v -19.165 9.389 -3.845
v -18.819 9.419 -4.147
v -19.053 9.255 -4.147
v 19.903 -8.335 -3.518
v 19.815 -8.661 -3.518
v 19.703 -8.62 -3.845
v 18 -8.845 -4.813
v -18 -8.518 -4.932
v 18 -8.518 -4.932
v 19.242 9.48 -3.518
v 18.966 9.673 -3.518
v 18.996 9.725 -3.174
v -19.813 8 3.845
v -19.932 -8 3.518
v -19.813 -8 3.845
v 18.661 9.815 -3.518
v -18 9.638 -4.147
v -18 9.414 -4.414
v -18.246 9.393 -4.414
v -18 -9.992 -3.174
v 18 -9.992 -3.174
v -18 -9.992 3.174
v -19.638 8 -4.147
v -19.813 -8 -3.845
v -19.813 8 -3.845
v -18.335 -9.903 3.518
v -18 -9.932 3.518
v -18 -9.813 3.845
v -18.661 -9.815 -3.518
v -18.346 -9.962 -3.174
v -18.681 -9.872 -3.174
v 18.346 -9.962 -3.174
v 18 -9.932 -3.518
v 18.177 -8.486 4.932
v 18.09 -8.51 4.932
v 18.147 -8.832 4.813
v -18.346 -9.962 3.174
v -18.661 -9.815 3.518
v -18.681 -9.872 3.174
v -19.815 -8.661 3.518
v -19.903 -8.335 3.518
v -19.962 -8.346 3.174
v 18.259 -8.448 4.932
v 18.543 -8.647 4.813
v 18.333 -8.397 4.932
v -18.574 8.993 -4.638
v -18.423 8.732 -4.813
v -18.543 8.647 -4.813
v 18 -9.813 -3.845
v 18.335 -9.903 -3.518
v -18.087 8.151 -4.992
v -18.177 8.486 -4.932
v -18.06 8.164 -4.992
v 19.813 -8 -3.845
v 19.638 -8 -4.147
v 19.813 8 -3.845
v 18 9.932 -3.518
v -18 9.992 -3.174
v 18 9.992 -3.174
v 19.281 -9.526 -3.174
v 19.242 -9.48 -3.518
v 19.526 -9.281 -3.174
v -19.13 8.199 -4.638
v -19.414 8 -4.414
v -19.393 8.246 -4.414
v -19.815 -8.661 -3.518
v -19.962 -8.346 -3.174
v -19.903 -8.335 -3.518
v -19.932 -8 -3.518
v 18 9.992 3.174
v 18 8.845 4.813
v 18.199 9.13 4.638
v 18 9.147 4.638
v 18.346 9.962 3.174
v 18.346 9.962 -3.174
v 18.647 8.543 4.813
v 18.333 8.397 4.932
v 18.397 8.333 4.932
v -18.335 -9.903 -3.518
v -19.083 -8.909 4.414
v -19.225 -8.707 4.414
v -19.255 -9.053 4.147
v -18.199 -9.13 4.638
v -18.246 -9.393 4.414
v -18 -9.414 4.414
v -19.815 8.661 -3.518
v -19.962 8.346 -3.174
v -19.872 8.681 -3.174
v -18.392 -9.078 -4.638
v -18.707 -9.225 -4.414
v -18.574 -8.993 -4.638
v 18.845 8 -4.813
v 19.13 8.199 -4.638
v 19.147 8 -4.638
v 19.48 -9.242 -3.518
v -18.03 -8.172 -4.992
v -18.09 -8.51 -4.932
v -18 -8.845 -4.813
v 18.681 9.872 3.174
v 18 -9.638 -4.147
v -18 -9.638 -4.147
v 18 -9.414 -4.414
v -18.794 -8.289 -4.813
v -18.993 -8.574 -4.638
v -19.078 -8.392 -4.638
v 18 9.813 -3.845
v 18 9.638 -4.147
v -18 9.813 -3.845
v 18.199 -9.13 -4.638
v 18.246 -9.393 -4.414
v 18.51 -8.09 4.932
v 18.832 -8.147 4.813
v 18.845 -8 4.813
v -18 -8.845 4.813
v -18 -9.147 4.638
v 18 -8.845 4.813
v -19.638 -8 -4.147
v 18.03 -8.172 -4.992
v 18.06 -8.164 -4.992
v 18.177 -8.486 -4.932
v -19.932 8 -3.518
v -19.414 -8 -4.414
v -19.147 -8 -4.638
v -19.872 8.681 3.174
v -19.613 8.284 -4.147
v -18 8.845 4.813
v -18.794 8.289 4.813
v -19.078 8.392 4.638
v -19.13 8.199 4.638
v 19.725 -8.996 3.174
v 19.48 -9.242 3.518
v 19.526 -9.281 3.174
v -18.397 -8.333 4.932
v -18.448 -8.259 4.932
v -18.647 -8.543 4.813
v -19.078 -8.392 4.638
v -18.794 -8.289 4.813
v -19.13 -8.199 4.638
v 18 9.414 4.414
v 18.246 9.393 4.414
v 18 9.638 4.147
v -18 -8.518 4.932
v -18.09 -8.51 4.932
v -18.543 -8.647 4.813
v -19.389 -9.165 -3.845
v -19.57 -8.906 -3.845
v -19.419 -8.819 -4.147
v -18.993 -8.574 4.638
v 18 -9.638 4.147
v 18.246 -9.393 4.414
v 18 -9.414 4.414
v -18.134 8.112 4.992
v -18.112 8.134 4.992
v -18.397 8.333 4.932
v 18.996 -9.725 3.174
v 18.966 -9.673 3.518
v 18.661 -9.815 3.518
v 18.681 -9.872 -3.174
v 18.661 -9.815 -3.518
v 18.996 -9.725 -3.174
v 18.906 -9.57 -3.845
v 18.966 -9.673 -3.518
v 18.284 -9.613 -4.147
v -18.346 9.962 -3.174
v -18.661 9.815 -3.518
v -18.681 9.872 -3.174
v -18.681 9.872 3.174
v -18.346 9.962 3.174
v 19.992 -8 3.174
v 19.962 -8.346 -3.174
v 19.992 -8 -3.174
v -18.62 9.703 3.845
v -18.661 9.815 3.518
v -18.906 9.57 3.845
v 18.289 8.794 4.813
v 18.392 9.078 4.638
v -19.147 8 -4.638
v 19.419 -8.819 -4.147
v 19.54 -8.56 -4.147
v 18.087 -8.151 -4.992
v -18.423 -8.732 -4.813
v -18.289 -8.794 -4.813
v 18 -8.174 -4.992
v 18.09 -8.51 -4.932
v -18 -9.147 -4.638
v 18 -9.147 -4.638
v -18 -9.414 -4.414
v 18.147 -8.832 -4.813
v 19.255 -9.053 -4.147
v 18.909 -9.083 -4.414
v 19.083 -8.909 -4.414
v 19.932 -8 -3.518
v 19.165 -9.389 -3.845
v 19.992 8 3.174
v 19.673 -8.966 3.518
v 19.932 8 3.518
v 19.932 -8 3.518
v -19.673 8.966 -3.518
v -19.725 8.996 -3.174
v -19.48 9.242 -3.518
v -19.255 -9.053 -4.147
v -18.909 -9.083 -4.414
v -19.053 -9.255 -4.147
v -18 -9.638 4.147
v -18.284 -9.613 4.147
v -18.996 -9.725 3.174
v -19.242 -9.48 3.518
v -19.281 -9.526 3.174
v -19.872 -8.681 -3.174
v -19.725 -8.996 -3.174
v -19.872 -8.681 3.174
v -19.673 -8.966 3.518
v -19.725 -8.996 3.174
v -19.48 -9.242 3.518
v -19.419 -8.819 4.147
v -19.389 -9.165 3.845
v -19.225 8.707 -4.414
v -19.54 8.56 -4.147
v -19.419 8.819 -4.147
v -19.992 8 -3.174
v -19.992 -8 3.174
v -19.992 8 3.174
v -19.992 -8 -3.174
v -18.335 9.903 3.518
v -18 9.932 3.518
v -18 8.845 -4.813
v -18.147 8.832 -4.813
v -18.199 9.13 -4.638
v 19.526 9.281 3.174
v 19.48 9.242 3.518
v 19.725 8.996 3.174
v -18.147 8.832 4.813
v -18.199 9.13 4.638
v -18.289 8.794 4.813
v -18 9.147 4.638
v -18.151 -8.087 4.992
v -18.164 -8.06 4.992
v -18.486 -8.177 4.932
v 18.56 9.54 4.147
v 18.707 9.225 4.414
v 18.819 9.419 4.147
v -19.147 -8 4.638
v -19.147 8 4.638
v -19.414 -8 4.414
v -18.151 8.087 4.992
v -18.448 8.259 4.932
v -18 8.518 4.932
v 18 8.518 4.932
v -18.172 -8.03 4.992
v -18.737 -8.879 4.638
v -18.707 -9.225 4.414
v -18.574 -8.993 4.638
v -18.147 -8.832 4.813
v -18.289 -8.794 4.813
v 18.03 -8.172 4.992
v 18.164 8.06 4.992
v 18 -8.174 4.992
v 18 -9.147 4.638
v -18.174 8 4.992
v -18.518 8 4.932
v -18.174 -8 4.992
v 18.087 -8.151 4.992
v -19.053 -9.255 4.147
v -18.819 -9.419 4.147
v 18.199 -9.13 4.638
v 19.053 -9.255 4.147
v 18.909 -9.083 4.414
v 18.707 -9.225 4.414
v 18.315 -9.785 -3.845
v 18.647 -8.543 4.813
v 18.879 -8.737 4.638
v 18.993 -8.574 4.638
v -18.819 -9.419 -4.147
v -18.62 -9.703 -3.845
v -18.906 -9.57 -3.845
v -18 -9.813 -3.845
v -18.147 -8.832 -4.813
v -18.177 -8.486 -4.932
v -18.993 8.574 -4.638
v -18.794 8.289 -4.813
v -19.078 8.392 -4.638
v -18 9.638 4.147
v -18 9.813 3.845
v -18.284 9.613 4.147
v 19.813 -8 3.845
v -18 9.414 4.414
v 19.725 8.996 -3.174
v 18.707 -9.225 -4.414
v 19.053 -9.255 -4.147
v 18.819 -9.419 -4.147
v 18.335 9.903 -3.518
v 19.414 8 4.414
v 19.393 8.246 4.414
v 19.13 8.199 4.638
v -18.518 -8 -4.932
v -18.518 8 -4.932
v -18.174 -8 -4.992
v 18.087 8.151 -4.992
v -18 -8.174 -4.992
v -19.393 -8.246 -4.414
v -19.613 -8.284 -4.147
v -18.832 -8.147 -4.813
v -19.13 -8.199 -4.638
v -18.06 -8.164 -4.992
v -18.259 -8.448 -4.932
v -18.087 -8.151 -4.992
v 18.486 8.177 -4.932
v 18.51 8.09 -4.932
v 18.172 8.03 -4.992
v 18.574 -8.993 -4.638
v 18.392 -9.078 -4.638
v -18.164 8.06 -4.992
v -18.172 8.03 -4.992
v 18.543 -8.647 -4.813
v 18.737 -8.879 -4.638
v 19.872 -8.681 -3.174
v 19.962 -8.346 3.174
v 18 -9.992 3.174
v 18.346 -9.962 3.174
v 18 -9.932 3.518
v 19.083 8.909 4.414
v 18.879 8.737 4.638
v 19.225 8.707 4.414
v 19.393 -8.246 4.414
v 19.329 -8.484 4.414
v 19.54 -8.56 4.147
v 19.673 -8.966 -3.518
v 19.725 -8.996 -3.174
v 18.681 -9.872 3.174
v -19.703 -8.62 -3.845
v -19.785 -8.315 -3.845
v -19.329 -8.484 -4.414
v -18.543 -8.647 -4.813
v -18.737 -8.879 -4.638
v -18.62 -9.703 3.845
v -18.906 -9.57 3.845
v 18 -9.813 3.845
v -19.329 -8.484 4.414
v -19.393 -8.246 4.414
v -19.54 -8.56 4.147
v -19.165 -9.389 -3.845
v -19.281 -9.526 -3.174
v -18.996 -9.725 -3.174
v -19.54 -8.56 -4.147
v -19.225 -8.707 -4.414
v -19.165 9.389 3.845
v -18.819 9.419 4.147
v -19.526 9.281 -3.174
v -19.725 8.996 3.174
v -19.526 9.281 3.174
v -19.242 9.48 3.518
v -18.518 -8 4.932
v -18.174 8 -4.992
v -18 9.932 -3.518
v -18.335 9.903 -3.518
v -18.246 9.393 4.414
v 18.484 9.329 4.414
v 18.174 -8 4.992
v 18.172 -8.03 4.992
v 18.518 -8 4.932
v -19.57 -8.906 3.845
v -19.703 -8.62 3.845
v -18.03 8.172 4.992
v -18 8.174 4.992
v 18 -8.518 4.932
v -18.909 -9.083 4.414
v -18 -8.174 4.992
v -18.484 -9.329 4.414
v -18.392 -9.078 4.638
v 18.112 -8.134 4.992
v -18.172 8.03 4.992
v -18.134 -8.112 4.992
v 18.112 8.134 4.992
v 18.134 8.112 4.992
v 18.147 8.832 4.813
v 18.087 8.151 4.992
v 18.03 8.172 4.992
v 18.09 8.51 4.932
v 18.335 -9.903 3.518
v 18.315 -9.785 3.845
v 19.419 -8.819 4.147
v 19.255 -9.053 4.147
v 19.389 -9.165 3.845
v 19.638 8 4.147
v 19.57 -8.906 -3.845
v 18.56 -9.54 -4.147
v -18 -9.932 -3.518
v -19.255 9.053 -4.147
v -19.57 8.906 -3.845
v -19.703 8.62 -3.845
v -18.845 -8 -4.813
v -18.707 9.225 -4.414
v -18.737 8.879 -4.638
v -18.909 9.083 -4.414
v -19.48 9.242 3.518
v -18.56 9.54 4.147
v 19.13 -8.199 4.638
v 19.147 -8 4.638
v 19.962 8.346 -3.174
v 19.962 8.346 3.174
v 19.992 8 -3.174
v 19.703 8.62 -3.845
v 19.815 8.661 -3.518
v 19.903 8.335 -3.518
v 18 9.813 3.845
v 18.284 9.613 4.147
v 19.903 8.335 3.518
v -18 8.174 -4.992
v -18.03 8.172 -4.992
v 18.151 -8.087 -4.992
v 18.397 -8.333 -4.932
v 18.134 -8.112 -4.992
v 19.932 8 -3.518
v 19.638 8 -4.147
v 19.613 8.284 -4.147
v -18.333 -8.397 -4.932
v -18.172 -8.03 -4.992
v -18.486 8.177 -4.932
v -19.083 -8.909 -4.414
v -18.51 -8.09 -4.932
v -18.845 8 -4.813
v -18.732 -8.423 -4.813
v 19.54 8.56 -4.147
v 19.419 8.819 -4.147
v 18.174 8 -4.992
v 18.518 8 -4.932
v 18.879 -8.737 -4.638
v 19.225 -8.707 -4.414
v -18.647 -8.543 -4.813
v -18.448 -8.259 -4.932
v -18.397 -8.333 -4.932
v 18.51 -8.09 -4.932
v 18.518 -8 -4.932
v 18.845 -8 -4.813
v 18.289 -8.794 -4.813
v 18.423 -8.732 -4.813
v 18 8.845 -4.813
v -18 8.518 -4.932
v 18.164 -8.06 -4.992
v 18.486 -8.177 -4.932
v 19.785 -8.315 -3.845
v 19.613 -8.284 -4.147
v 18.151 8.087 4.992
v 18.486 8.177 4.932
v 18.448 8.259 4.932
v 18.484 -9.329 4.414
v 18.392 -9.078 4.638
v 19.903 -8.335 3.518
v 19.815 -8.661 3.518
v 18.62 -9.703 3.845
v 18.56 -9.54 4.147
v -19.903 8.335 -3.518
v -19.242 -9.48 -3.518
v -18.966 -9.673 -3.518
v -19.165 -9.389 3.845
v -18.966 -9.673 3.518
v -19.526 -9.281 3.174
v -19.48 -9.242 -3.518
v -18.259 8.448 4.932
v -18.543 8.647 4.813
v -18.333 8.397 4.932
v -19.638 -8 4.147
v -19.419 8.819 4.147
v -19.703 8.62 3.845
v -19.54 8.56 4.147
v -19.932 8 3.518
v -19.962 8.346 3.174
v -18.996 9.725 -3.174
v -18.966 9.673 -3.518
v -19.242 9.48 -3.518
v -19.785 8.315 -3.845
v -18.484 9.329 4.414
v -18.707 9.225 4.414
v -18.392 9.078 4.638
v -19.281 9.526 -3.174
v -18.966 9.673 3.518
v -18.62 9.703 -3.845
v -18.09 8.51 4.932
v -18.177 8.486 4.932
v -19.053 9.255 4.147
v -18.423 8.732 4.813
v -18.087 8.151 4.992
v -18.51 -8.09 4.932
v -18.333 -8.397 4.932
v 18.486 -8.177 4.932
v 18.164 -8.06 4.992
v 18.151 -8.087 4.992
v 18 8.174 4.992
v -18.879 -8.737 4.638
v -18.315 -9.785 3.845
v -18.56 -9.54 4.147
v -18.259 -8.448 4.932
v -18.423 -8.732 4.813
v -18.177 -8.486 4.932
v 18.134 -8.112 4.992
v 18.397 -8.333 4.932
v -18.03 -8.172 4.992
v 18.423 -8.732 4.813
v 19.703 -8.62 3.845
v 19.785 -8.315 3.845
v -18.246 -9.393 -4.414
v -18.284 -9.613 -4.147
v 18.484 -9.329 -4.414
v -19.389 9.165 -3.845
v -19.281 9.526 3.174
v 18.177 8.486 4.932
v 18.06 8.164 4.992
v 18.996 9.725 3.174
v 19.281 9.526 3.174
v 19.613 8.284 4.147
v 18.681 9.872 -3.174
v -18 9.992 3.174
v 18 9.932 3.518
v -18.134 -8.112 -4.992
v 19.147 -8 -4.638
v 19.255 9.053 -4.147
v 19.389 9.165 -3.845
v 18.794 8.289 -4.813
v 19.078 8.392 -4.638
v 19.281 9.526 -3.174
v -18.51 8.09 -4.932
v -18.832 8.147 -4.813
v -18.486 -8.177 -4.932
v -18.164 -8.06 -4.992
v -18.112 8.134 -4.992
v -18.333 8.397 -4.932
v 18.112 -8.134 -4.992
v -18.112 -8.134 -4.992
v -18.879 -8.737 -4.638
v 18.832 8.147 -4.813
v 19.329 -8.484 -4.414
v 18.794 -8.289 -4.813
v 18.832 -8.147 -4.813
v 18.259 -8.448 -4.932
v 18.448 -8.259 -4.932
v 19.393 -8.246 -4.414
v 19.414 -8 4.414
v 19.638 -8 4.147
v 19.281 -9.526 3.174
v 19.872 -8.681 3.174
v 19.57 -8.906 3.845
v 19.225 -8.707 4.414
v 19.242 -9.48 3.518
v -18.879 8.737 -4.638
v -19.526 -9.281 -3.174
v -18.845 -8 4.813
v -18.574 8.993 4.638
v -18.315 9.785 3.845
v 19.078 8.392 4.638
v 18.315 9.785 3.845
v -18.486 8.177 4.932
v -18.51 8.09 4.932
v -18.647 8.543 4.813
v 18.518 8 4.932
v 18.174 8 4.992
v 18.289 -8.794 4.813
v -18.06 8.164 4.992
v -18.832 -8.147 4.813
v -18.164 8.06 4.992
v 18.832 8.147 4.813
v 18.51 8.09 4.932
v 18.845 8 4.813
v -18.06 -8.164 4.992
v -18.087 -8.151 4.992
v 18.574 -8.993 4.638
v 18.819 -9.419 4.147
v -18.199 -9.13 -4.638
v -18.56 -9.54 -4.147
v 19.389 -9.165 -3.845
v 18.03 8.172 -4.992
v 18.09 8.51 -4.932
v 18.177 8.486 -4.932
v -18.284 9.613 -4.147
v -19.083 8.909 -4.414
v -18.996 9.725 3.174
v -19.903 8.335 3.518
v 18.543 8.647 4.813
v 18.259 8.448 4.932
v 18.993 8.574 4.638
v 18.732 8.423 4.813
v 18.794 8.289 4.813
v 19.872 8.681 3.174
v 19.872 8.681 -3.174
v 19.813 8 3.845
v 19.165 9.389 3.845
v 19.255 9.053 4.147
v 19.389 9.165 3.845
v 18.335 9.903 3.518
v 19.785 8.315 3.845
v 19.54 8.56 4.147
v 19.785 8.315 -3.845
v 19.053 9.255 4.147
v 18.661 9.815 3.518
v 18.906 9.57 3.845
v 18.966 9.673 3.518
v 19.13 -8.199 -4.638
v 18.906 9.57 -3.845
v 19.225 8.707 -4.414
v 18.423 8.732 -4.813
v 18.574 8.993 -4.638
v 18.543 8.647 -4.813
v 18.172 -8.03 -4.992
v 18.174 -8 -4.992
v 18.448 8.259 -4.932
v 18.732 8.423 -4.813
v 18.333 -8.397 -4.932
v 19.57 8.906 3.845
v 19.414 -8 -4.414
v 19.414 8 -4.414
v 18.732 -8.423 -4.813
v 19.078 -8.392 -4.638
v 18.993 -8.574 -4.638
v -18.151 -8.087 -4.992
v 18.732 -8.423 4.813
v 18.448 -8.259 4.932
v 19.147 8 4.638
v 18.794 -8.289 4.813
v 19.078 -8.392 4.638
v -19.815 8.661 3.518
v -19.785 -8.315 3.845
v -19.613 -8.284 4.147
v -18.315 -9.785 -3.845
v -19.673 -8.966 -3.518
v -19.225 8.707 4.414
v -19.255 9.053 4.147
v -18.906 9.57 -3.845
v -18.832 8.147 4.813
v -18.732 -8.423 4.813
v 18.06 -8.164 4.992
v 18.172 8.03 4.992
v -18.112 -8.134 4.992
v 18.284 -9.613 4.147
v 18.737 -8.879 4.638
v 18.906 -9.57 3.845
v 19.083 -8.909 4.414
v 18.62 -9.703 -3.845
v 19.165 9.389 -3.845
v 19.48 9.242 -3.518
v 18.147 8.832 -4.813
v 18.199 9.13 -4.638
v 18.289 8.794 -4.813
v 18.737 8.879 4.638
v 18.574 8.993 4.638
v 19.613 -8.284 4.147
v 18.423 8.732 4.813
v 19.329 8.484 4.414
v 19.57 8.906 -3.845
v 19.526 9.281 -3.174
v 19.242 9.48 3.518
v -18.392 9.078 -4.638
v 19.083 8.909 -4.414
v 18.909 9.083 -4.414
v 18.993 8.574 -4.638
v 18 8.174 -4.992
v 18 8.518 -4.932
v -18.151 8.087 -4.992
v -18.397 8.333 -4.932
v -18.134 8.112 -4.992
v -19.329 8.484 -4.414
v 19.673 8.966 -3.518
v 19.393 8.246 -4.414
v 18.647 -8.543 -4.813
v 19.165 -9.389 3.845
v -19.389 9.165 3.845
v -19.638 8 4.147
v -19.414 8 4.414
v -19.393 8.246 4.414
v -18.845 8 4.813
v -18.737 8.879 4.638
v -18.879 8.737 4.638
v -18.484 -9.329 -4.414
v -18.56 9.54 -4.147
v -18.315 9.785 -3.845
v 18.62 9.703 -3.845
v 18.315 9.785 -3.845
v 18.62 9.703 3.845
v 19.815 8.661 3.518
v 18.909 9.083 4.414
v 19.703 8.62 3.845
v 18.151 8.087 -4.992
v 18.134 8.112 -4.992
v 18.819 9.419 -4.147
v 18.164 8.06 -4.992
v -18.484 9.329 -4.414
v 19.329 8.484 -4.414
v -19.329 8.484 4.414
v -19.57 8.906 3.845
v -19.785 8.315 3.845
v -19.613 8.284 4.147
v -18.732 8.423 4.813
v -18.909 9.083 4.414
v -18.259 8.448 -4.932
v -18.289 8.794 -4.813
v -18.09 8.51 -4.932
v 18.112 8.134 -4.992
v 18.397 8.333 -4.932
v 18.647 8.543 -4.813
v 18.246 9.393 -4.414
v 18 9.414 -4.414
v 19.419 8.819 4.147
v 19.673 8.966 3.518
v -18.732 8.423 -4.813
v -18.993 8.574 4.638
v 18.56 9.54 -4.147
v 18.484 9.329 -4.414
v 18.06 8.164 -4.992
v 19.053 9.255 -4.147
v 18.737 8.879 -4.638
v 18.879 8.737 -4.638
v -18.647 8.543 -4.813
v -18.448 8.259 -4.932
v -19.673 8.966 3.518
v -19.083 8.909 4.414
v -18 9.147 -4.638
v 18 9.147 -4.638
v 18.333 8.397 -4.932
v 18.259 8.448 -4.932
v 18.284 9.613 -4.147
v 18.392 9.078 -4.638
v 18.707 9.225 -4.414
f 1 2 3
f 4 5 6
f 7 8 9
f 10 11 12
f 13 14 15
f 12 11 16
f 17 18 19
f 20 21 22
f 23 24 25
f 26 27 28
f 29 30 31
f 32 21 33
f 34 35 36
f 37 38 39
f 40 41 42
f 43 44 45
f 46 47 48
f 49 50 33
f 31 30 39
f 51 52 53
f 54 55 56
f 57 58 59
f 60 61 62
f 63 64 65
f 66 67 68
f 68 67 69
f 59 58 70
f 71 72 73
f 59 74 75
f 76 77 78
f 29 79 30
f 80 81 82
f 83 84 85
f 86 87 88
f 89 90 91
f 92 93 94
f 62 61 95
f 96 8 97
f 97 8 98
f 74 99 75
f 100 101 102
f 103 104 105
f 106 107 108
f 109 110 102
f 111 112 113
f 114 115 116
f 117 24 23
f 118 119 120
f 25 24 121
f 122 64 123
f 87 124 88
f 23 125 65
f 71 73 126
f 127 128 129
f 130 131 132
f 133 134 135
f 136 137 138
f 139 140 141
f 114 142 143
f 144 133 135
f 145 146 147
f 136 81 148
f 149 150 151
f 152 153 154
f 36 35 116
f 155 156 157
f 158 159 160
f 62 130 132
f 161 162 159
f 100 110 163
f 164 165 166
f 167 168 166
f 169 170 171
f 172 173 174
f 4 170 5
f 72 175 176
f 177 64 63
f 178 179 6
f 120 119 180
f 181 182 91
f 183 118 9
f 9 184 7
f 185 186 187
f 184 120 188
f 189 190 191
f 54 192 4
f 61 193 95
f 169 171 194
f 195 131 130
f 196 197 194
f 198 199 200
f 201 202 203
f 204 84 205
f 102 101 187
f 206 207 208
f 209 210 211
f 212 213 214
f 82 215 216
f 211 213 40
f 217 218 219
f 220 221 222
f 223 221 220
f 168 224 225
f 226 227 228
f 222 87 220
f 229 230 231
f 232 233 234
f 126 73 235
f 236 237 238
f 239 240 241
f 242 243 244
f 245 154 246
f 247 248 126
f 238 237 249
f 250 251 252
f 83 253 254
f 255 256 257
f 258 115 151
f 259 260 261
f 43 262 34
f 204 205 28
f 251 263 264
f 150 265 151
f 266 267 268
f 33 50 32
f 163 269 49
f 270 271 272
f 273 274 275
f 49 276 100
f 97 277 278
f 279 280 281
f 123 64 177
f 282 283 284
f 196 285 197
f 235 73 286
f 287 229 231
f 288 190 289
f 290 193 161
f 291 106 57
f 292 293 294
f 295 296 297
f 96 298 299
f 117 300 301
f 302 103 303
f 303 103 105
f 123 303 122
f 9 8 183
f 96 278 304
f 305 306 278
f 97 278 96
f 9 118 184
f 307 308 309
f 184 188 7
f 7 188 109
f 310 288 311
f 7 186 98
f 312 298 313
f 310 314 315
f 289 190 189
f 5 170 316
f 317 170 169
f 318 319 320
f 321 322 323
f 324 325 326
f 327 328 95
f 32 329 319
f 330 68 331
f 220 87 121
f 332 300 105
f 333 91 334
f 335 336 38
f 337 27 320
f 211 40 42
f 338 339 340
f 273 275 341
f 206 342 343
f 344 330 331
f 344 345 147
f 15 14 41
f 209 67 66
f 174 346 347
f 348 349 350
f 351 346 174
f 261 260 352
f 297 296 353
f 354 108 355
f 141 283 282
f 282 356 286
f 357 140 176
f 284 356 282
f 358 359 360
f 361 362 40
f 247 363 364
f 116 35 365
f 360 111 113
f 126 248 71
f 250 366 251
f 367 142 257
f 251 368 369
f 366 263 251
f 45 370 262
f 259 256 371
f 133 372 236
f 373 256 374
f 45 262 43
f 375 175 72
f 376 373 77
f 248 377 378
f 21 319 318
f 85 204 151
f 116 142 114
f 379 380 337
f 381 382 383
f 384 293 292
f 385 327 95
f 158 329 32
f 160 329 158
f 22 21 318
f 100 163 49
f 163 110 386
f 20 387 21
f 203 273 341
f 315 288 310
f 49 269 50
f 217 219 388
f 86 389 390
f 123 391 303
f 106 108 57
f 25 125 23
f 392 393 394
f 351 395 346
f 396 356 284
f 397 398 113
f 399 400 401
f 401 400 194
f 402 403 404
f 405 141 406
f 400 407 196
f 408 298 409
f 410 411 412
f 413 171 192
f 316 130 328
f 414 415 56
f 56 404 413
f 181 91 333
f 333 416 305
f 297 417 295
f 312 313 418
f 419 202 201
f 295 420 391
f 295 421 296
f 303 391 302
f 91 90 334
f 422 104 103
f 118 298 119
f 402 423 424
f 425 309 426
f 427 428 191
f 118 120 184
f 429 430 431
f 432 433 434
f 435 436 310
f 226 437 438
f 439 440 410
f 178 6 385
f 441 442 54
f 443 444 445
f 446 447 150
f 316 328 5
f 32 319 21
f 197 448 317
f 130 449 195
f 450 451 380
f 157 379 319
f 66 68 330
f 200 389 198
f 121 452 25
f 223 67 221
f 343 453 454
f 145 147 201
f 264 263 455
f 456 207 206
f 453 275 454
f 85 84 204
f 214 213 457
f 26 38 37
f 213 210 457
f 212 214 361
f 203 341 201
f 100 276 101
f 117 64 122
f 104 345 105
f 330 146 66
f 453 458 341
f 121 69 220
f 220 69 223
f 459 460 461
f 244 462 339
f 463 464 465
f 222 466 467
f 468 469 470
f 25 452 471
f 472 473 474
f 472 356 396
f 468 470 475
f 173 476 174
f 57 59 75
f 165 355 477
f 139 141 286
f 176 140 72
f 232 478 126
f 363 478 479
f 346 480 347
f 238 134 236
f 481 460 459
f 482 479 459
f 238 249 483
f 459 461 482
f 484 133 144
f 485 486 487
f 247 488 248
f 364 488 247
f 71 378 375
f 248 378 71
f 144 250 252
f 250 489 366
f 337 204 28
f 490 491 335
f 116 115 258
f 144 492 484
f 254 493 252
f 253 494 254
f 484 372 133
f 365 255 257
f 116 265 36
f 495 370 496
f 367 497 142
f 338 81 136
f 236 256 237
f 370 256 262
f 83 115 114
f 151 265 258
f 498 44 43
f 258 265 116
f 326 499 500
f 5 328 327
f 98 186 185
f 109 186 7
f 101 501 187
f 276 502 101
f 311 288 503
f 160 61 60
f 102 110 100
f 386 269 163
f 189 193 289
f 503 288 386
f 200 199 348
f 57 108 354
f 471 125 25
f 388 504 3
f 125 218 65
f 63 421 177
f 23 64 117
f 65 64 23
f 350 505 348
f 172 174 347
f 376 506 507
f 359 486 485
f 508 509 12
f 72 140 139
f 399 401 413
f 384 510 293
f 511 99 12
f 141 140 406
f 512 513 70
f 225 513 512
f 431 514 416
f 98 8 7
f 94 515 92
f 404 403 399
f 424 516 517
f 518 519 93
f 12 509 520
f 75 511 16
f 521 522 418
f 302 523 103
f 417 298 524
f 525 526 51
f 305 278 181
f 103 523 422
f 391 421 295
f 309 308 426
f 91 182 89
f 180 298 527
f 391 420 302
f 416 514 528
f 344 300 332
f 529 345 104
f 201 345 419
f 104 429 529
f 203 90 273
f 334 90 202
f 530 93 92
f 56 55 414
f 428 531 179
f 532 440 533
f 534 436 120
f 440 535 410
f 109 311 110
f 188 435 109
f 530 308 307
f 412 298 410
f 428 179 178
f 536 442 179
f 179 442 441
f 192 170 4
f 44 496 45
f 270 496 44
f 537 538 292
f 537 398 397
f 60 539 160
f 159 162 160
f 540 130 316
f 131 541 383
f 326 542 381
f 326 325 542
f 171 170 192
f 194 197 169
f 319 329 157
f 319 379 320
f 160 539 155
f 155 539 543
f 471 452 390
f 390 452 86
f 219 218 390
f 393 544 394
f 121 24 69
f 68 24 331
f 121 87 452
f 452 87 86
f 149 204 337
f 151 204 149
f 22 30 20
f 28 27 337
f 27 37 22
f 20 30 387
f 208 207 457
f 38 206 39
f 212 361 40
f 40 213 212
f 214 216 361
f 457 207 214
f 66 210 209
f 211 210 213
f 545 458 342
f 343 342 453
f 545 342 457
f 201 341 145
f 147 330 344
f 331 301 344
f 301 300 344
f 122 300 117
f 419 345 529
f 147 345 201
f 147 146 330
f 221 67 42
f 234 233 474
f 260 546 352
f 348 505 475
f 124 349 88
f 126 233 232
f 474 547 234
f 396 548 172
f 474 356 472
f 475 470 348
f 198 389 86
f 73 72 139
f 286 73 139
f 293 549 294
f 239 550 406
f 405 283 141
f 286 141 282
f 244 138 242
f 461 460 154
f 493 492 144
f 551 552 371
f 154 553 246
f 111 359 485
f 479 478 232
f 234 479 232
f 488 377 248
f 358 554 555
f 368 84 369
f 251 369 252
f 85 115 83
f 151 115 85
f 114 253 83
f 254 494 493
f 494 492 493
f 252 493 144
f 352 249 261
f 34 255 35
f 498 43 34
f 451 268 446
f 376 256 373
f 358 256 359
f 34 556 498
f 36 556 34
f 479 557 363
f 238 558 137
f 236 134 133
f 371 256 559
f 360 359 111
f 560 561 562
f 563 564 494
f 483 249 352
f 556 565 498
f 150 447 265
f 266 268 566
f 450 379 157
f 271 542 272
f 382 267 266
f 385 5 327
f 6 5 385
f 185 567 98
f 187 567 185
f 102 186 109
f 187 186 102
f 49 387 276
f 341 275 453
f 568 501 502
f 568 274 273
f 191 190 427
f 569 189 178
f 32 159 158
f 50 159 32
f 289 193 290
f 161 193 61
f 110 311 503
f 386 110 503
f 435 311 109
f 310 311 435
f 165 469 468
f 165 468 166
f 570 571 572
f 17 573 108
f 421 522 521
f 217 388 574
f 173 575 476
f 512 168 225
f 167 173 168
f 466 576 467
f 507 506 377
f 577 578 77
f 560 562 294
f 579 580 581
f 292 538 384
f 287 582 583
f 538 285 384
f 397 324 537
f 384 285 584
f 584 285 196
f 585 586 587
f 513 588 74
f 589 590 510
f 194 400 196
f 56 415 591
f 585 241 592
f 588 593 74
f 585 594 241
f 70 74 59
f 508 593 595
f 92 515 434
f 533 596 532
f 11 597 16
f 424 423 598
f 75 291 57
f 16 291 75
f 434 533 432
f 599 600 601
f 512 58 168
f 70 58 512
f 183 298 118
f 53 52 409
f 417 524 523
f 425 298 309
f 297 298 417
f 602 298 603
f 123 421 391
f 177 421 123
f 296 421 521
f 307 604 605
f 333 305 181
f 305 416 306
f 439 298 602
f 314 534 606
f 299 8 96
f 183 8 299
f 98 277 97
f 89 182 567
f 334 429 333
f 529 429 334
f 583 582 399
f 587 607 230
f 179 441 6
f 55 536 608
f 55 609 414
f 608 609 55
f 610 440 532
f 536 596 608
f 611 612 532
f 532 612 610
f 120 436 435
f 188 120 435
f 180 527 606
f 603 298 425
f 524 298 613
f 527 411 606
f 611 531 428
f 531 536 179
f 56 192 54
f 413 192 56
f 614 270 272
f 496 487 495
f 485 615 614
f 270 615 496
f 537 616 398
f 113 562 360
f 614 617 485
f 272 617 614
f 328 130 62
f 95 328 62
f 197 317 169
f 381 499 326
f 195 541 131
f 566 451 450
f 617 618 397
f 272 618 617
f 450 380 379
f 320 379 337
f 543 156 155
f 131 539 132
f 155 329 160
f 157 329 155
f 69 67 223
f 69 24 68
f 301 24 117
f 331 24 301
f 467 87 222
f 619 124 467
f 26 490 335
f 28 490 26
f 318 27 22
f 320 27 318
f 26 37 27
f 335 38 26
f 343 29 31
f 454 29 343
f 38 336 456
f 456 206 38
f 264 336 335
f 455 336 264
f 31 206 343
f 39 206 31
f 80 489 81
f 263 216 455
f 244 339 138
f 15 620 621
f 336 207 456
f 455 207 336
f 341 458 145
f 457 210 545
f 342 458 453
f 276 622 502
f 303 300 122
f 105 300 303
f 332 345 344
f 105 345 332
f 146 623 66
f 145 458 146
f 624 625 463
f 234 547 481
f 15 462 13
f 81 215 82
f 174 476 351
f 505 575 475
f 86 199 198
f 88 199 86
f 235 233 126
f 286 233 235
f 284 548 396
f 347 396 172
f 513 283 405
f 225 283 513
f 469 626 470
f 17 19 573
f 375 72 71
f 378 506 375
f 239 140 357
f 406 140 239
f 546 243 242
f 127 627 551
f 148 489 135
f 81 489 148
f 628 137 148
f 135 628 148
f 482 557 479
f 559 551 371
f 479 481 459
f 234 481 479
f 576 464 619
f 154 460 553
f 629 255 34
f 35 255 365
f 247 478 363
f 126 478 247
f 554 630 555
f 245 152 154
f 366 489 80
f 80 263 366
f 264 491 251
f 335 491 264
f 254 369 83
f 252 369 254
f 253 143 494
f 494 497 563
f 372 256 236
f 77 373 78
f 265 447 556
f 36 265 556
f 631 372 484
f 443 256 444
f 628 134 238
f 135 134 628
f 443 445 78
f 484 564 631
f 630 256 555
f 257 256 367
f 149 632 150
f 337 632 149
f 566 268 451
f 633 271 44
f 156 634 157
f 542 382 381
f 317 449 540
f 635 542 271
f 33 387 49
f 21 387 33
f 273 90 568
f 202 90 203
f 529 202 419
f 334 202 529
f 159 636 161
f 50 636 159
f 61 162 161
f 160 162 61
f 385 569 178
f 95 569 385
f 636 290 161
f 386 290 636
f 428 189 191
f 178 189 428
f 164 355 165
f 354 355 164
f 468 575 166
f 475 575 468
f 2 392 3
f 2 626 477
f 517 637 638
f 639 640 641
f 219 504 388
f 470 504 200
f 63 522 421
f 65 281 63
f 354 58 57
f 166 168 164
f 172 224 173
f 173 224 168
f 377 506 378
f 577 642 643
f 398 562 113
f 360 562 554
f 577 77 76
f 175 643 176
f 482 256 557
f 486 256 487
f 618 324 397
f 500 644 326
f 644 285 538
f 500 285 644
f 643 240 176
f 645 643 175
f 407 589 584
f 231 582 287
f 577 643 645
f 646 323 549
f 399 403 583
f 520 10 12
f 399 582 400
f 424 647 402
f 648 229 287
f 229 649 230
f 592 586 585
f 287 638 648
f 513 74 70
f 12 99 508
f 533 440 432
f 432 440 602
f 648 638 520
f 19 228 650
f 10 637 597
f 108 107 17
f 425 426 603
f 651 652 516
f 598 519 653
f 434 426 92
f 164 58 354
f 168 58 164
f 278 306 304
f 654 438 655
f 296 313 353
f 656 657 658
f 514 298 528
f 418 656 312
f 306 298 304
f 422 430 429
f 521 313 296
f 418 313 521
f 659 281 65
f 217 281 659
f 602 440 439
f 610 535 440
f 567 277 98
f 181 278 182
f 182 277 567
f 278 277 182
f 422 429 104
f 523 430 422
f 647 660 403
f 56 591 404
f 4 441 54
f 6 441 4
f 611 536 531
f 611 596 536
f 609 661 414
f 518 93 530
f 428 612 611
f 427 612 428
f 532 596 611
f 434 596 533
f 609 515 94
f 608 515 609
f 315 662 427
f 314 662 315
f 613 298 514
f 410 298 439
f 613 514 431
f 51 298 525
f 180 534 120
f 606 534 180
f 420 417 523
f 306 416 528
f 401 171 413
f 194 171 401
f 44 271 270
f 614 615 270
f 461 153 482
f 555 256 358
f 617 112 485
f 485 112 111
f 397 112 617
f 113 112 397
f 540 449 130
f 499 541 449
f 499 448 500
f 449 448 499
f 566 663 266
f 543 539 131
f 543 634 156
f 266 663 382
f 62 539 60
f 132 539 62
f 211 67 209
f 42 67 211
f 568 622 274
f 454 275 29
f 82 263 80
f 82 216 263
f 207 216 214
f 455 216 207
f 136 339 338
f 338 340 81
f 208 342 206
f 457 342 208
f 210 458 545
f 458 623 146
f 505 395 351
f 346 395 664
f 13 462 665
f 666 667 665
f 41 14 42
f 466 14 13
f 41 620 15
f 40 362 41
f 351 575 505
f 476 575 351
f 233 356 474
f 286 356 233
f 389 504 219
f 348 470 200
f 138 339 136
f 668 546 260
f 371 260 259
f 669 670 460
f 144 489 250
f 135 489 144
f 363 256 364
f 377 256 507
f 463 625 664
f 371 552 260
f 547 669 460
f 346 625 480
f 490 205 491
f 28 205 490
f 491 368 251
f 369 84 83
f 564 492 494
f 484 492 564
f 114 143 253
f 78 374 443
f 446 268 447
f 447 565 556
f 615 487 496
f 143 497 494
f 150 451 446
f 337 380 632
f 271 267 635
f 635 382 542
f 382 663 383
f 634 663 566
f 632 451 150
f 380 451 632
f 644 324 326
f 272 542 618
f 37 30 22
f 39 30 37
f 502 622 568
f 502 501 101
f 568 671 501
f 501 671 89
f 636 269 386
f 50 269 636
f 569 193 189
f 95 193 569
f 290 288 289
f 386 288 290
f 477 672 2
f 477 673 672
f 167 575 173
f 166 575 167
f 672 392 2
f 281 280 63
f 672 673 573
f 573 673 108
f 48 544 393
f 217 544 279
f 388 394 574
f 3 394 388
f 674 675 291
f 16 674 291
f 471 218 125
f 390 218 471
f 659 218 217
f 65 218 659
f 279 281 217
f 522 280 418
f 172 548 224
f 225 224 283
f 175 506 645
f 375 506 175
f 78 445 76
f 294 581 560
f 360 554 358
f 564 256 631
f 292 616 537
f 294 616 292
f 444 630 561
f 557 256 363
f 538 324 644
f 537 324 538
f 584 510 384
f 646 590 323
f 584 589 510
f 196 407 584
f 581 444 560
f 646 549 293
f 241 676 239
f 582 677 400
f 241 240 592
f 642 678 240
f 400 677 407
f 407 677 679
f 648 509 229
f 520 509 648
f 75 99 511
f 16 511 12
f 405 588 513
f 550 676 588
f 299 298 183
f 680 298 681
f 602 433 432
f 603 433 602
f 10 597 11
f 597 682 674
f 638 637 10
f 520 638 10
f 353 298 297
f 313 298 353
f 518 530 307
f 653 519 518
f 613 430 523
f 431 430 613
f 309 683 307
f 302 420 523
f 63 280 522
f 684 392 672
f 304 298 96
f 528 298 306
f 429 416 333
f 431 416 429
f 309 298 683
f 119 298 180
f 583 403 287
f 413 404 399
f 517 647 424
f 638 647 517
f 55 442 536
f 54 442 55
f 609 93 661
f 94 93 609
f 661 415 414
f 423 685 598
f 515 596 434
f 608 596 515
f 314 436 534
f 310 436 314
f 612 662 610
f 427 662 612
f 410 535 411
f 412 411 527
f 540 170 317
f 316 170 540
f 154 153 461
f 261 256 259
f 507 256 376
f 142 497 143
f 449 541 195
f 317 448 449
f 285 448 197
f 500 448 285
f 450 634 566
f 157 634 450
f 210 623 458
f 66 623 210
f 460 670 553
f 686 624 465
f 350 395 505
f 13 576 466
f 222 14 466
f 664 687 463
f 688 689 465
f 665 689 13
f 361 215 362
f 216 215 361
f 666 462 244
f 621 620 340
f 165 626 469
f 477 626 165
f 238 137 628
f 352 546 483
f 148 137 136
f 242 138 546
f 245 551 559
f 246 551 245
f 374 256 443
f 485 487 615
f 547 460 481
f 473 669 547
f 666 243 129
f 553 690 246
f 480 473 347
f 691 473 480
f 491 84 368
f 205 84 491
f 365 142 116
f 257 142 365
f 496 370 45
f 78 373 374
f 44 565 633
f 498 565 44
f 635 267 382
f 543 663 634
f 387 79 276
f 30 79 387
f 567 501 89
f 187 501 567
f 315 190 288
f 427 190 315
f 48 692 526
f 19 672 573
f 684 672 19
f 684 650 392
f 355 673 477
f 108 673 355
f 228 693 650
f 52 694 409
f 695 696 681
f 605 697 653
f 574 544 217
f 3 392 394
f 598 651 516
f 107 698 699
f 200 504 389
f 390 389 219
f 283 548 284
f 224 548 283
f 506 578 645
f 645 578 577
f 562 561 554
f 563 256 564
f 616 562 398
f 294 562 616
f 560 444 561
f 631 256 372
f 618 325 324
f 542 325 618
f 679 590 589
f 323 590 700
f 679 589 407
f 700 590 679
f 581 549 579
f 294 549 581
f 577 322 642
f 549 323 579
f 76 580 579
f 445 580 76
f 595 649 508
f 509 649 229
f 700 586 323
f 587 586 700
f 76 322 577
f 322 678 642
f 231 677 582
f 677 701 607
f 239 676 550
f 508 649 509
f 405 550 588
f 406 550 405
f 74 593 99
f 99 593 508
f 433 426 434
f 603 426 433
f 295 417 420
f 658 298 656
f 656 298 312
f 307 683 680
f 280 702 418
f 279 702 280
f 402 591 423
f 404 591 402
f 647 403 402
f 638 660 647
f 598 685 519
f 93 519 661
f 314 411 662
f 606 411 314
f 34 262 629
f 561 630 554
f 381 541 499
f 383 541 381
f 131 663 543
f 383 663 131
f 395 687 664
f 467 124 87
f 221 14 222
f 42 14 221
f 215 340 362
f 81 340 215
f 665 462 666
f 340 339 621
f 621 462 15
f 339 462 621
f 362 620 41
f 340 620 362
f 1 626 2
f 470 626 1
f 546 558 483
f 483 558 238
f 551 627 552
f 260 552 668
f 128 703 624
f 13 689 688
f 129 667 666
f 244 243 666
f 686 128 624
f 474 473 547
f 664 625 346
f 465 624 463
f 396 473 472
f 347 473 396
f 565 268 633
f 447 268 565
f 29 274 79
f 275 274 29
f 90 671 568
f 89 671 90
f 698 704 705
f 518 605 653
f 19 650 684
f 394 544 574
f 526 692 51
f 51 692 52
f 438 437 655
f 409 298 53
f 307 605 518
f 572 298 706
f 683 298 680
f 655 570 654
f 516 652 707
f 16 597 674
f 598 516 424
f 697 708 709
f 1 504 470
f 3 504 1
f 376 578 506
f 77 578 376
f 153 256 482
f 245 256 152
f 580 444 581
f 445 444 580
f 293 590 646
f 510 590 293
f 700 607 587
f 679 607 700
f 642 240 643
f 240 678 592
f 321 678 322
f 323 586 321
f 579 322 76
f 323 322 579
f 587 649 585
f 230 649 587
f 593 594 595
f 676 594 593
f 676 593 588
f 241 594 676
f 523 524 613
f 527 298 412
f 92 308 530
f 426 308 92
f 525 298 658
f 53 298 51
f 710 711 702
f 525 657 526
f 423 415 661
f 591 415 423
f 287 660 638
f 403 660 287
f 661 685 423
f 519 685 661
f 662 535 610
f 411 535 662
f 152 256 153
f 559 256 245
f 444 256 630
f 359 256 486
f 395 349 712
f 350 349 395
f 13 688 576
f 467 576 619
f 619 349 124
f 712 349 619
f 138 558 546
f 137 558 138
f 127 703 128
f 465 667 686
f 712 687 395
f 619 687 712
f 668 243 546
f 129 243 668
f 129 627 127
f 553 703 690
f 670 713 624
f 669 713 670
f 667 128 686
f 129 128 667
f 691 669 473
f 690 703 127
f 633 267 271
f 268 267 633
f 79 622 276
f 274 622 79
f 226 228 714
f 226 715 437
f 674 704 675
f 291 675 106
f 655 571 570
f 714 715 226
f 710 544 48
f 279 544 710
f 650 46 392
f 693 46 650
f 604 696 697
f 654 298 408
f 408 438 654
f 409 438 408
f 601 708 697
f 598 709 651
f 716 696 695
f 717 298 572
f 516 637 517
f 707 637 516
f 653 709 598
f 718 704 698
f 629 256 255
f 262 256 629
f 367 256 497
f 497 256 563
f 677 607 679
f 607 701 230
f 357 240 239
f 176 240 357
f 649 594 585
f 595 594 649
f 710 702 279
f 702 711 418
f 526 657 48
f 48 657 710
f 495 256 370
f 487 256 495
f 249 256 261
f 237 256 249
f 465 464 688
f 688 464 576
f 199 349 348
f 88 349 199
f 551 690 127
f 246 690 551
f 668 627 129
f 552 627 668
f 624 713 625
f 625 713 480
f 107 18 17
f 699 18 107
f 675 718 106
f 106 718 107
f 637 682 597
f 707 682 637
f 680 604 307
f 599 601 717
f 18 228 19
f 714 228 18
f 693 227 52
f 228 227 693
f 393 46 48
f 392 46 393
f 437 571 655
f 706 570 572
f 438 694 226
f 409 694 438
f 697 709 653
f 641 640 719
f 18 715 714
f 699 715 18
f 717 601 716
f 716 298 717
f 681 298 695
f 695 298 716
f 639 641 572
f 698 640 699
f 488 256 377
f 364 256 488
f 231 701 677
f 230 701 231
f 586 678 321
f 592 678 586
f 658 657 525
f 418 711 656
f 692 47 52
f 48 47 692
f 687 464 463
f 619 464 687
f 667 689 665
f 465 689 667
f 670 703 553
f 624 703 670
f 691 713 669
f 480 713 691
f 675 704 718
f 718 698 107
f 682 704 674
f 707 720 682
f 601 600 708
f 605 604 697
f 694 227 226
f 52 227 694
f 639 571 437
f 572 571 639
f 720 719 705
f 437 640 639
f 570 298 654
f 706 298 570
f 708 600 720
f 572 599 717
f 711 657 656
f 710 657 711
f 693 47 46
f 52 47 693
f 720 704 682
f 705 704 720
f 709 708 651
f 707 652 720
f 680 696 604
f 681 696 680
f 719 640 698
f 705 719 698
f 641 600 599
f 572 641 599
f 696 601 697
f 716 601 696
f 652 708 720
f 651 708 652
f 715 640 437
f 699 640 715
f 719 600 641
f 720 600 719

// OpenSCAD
module roundChamferedBox(l, w, h, r, fn) {
    minkowski() {
        cube(
            [
                l - 2*r,
                w - 2*r,
                h - 2*r
            ],
            center = true
        );
        sphere(r=r, $fn=fn);
    }
}
roundChamferedBox(40,20,10, 2, 36);
